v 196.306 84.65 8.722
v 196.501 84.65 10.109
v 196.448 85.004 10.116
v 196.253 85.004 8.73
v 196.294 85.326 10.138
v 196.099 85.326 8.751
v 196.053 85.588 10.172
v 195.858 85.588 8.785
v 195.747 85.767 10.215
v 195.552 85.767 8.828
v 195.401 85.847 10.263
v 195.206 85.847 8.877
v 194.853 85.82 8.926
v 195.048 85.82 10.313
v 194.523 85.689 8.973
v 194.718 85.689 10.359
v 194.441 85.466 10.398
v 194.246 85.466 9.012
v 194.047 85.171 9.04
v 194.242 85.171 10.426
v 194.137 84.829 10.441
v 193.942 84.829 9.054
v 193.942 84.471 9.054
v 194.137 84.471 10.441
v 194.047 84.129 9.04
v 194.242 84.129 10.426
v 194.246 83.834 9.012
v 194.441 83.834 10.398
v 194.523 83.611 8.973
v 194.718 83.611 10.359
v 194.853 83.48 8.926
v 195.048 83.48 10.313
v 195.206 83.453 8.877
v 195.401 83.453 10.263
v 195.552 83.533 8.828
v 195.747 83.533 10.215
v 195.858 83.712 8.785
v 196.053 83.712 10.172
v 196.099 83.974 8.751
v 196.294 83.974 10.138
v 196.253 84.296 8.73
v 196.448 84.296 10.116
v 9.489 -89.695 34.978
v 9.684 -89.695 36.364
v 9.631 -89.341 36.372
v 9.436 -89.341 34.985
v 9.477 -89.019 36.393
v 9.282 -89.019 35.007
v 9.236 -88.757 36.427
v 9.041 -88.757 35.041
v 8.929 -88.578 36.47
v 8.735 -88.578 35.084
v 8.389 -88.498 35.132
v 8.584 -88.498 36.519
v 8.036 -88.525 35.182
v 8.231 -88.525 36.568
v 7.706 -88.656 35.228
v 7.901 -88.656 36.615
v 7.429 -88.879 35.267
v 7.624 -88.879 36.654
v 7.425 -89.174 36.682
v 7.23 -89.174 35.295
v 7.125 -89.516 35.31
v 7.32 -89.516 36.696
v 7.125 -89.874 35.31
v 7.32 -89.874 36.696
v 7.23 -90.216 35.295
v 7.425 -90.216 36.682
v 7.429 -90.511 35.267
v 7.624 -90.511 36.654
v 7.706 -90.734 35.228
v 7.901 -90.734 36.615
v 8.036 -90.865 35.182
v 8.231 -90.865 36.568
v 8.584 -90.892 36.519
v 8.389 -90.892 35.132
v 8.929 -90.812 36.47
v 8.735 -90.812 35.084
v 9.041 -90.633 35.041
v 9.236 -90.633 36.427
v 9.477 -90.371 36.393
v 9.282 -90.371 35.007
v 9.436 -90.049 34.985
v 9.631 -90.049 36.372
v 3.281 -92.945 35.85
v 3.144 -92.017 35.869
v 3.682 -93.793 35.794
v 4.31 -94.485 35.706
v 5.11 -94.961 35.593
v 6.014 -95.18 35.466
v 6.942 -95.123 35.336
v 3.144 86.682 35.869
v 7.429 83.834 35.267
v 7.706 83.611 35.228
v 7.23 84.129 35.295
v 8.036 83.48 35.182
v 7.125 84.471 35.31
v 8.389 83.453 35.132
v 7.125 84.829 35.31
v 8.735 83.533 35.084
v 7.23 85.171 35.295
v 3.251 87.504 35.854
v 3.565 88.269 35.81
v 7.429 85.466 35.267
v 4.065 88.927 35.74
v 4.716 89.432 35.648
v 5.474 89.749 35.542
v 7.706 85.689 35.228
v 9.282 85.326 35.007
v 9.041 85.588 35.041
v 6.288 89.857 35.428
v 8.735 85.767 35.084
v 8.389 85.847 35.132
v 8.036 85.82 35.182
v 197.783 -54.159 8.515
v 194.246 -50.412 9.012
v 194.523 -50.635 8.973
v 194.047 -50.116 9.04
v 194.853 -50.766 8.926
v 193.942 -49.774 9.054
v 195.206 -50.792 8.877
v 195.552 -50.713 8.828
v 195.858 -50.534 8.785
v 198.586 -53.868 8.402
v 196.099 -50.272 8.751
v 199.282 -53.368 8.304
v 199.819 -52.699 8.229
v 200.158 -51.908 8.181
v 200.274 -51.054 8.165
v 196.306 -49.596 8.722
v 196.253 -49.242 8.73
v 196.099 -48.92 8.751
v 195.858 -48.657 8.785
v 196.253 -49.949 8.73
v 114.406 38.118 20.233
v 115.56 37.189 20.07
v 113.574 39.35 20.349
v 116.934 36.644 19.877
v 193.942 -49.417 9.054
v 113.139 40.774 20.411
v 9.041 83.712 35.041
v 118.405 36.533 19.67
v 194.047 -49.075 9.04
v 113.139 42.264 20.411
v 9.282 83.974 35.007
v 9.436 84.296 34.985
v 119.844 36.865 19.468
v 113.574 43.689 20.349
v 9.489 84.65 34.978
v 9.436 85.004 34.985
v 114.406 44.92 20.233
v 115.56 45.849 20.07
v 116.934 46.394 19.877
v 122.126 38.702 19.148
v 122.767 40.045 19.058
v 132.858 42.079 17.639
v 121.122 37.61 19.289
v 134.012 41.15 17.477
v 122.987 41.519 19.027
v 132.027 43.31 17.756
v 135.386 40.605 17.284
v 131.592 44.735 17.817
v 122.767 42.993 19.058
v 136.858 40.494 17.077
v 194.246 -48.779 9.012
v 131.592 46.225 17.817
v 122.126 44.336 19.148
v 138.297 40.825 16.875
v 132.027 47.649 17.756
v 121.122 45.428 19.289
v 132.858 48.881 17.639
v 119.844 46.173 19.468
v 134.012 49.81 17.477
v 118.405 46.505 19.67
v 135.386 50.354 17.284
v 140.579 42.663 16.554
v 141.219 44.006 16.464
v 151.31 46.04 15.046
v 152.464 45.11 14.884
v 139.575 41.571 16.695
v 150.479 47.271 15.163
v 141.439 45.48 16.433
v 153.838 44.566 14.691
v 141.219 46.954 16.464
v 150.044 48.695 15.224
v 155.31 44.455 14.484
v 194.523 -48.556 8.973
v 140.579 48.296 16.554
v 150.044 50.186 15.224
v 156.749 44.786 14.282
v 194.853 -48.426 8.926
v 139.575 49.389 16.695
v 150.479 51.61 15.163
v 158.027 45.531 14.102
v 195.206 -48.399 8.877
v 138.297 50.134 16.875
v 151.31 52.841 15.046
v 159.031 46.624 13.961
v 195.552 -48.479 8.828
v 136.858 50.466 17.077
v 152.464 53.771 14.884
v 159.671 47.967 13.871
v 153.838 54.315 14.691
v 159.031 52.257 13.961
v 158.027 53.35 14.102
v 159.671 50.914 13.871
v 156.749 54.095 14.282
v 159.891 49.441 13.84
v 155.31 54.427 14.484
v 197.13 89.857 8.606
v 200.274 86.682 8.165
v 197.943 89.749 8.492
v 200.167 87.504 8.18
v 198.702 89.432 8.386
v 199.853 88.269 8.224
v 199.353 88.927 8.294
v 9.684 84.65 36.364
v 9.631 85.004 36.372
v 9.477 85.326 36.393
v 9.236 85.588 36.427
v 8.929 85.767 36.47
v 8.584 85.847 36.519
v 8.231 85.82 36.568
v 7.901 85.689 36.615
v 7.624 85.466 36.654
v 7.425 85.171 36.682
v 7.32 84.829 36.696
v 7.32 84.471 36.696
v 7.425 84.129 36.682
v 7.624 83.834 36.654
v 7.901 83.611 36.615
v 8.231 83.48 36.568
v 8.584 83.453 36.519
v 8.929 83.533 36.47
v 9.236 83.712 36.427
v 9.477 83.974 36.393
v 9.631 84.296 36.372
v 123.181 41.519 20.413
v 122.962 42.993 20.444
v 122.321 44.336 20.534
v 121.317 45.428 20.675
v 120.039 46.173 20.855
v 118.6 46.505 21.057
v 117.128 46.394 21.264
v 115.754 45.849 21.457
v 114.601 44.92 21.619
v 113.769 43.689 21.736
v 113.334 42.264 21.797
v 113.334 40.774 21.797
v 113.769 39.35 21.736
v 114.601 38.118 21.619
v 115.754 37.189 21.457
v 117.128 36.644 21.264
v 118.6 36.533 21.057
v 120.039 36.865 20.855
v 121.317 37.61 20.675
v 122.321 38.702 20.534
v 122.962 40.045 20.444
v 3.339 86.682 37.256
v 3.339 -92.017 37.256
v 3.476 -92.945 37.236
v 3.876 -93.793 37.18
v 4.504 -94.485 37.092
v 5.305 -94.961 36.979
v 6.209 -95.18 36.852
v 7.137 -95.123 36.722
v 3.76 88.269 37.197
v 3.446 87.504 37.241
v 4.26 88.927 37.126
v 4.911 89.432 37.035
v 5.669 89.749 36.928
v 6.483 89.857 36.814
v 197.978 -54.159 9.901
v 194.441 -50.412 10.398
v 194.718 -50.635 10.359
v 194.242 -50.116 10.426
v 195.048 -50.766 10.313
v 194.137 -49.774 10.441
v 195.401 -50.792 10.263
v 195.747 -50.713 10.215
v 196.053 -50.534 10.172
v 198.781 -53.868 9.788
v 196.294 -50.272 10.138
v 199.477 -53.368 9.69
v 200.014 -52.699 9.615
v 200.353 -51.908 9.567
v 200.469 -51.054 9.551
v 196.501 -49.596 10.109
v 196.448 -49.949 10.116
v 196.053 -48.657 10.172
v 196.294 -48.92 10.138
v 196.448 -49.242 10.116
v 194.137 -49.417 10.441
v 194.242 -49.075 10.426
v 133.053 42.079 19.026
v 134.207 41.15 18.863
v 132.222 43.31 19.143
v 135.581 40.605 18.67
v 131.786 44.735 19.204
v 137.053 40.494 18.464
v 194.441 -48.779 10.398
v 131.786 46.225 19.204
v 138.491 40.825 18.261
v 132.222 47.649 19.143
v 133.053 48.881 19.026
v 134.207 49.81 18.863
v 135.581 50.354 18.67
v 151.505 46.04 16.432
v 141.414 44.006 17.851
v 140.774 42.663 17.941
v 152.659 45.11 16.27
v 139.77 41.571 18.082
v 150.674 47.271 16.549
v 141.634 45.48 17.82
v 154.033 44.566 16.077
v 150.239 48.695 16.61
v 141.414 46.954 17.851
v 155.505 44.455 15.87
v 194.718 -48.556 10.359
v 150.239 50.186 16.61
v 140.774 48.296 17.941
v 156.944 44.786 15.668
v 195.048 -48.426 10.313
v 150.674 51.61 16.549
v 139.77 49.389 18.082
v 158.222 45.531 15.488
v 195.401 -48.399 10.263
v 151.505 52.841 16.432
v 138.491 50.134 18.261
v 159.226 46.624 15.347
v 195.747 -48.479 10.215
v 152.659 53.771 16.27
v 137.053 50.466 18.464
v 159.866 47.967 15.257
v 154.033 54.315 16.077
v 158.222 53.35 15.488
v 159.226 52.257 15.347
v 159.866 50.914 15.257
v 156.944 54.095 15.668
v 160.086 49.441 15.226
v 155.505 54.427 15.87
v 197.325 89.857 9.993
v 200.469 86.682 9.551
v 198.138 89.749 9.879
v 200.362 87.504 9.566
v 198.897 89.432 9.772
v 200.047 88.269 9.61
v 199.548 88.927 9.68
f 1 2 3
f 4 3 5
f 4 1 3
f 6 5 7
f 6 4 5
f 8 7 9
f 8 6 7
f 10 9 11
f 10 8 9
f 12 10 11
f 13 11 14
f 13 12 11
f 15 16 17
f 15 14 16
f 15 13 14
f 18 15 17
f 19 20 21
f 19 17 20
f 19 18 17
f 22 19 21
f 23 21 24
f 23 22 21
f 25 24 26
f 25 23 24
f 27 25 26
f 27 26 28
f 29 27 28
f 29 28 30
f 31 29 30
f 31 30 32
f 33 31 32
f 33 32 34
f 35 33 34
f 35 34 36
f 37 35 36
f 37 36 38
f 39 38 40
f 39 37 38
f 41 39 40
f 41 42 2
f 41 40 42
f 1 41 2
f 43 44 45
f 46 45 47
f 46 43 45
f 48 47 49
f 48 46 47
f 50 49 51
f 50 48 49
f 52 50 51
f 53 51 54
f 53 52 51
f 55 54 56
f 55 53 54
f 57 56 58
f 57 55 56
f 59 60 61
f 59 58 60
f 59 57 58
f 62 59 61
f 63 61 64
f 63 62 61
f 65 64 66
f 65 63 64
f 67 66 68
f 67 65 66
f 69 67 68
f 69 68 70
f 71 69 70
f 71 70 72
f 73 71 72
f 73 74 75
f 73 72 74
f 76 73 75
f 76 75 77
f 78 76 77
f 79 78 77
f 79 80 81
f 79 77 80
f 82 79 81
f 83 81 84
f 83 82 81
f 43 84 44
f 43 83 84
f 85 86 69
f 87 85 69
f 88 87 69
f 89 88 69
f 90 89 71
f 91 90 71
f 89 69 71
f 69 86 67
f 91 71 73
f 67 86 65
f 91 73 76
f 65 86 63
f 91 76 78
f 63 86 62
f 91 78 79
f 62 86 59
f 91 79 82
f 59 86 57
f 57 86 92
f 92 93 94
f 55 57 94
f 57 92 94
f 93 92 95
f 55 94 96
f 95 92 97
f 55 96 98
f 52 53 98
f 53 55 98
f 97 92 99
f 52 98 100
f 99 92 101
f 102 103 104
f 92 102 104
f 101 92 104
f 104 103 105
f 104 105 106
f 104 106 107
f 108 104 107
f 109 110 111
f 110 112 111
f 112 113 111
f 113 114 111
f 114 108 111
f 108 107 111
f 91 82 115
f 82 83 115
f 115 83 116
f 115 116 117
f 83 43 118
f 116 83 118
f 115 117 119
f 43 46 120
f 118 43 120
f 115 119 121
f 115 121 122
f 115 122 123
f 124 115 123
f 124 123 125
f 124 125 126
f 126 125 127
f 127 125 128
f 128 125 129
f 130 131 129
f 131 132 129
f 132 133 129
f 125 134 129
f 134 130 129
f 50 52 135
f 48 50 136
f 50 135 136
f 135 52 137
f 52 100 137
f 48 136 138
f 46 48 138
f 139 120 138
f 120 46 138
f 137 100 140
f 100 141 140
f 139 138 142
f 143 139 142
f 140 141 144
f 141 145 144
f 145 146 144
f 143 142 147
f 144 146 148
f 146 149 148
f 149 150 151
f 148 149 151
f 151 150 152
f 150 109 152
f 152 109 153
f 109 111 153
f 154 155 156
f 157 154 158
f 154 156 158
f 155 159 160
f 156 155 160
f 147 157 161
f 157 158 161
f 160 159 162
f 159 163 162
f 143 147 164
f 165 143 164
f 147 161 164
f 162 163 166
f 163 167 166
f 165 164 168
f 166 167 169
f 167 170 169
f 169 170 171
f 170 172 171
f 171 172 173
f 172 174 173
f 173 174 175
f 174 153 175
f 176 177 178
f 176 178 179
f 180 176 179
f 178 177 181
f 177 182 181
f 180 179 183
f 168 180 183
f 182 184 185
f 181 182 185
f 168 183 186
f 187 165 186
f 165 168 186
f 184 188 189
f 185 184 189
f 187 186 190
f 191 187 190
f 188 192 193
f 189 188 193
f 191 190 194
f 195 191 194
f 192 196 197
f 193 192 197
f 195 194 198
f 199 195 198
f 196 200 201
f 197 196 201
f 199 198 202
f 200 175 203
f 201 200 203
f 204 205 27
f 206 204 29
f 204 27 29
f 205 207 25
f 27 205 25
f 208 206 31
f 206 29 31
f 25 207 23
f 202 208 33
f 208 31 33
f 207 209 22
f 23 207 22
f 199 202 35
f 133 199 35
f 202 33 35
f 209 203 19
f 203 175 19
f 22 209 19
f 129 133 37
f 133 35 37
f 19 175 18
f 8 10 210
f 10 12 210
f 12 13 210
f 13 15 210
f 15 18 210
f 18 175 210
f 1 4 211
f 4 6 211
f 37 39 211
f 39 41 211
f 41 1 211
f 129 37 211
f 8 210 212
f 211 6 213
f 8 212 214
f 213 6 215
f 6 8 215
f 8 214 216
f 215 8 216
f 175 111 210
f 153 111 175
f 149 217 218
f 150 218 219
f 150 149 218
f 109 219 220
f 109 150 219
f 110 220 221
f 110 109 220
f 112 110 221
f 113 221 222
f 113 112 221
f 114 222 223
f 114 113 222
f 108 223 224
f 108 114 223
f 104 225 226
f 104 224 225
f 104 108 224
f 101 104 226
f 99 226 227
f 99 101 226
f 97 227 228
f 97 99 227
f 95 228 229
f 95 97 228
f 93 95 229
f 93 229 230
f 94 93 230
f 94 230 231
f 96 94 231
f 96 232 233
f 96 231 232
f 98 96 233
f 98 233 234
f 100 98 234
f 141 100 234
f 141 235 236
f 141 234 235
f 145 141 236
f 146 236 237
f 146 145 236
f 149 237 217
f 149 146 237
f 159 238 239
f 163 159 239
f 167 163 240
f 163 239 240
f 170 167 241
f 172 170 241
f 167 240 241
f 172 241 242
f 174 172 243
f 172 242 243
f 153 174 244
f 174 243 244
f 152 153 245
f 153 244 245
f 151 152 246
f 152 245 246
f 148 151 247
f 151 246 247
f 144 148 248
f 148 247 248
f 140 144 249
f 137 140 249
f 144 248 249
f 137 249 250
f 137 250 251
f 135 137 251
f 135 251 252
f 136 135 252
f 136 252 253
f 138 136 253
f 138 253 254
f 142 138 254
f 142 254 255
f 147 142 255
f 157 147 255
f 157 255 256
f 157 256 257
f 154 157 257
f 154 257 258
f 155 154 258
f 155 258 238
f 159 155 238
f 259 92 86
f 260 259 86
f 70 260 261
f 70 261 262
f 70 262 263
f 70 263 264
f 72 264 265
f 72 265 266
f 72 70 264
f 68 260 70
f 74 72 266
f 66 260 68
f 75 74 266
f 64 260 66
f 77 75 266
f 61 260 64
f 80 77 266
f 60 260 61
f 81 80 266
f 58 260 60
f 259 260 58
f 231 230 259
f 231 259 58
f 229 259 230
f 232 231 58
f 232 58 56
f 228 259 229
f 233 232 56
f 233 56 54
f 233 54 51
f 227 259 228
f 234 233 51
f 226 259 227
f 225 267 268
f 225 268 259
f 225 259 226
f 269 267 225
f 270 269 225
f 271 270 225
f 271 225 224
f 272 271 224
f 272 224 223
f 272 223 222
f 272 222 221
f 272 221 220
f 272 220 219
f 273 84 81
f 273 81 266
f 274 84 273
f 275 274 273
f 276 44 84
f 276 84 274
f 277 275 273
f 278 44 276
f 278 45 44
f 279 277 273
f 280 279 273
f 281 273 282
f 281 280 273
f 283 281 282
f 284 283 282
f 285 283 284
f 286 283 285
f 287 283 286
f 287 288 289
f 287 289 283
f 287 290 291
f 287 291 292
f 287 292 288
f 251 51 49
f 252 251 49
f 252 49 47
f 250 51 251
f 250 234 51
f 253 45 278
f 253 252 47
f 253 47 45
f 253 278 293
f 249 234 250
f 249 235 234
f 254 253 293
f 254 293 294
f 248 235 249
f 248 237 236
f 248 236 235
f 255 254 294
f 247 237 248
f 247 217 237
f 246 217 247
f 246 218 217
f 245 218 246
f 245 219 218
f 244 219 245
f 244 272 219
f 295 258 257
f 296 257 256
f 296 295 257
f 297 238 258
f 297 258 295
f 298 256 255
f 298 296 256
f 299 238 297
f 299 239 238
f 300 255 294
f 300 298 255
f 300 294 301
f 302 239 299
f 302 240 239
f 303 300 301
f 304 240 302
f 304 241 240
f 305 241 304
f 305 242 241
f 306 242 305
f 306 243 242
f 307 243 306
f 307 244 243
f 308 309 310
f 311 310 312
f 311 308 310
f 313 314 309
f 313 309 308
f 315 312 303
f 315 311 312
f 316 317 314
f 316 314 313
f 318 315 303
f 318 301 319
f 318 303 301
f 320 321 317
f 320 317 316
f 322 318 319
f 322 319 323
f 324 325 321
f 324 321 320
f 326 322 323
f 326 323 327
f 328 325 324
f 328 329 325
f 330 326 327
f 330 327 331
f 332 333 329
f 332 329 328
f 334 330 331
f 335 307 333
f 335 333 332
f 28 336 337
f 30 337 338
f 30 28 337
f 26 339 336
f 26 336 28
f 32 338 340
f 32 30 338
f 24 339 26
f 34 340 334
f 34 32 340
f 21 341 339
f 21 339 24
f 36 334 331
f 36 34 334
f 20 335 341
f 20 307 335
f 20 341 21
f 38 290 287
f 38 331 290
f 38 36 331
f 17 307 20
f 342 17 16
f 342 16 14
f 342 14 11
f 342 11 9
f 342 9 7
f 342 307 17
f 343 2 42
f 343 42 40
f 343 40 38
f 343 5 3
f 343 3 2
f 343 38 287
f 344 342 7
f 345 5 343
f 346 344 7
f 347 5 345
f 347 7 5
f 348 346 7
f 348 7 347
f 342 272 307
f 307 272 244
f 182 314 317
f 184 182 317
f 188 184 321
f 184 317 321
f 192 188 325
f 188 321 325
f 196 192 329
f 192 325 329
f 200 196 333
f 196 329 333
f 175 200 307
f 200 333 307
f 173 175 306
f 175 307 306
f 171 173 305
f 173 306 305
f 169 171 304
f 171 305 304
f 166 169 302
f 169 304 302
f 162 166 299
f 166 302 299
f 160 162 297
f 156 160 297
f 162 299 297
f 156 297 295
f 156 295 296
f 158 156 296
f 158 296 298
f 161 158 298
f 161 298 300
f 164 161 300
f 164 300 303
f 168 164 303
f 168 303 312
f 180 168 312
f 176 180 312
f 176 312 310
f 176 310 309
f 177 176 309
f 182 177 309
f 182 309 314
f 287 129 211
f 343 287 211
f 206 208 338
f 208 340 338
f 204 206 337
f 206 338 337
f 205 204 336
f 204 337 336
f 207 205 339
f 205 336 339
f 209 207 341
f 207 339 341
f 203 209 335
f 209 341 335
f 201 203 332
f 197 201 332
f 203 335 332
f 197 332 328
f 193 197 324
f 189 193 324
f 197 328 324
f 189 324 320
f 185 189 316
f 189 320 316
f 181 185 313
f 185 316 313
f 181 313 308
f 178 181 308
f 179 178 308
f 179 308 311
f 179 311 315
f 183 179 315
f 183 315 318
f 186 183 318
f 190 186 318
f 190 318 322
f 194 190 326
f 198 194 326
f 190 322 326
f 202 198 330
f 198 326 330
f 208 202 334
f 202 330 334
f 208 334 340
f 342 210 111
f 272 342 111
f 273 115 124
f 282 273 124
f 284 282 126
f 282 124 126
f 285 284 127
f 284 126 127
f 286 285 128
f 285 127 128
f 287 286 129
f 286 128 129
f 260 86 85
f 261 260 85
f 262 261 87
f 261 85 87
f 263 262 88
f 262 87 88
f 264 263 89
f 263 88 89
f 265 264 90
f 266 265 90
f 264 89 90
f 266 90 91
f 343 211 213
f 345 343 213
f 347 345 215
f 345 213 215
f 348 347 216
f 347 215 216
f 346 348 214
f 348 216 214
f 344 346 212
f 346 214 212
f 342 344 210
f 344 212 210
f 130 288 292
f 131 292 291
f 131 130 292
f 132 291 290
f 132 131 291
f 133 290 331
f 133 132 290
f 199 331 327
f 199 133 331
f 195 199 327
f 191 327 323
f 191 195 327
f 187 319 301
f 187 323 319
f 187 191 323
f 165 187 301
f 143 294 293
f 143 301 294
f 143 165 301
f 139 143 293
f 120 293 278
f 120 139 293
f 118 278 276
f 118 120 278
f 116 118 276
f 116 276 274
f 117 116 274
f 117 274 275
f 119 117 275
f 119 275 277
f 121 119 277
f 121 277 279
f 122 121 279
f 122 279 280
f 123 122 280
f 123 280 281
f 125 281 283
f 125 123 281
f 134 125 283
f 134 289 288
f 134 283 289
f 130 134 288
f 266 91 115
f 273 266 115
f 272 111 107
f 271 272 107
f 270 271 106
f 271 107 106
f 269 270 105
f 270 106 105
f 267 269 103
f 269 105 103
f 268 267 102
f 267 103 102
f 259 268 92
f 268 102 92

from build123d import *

# Parameters (mm, degrees)
SKETCH030_AS_DRAWN_R                      = 5
EXTRUDE025_DEPTH                          = 25.4
EXTRUDE025_ONTO_SKETCH030_PLACEMENT_ANGLE = 8
SKETCH018_AS_DRAWN_R                      = 1.2
EXTRUDE009_DEPTH                          = 7.8
EXTRUDE009_ONTO_SKETCH018_PLACEMENT_ANGLE = 8
EXTRUDE010_DEPTH                          = 1.4
EXTRUDE010_ONTO_SKETCH019_PLACEMENT_ANGLE = 8


with BuildPart() as plate_led_holes:
    # Sketch030 as drawn → Extrude025 (new, symmetric)
    with BuildSketch(Plane.XY):
        with Locations((78.81499, 41.5191)):
            Circle(SKETCH030_AS_DRAWN_R)
        with Locations((97.448702, 45.479818)):
            Circle(SKETCH030_AS_DRAWN_R)
        with Locations((116.082414, 49.440535)):
            Circle(SKETCH030_AS_DRAWN_R)
    extrude(amount=EXTRUDE025_DEPTH, both=True)


with BuildPart() as plate_led_holes_1:
    # Extrude025 onto Sketch030 placement: moved
    add(plate_led_holes.part.moved(Location((42.3672, 0, 47.625))).rotate(Axis((42.3672, 0, 47.625), (0, 1, 0)), EXTRUDE025_ONTO_SKETCH030_PLACEMENT_ANGLE))


with BuildPart() as screw_hole_cuts:
    # Sketch018 as drawn → Extrude009 (new)
    with BuildSketch(Plane.XY):
        with Locations((-31.998318, 84.649891)):
            Circle(SKETCH018_AS_DRAWN_R)
        with Locations((-31.998318, -89.695043)):
            Circle(SKETCH018_AS_DRAWN_R)
        with Locations((156.654735, -49.595599)):
            Circle(SKETCH018_AS_DRAWN_R)
        with Locations((156.654735, 84.649891)):
            Circle(SKETCH018_AS_DRAWN_R)
    extrude(amount=EXTRUDE009_DEPTH)


with BuildPart() as screw_hole_cuts_1:
    # Extrude009 onto Sketch018 placement: moved
    add(screw_hole_cuts.part.moved(Location((39.98734, 0, 30.691416))).rotate(Axis((39.98734, 0, 30.691416), (0, 1, 0)), EXTRUDE009_ONTO_SKETCH018_PLACEMENT_ANGLE))


with BuildPart() as cut017:
    # Sketch019 as drawn → Extrude010 (new)
    with BuildSketch(Plane.XY):
        with BuildLine():
            Line((-37.205318, 86.681891), (-37.205318, -92.017095))
            ThreePointArc((-37.205318, -92.017095), (-36.028411, -94.484534), (-33.370199, -95.122714))
            Line((-33.370199, -95.122714), (159.34685, -54.159441))
            ThreePointArc((159.34685, -54.159441), (161.154172, -53.051915), (161.861735, -51.053821))
            Line((161.861735, -51.053821), (161.861735, 86.681892))
            ThreePointArc((161.861735, 86.681892), (160.931799, 88.926956), (158.686734, 89.856891))
            Line((158.686734, 89.856891), (-34.030318, 89.856891))
            ThreePointArc((-34.030318, 89.856891), (-36.275382, 88.926955), (-37.205318, 86.681891))
        make_face()
    extrude(amount=EXTRUDE010_DEPTH)


with BuildPart() as cut017_1:
    # Extrude010 onto Sketch019 placement: moved
    add(cut017.part.moved(Location((39.98734, 0, 30.691416))).rotate(Axis((39.98734, 0, 30.691416), (0, 1, 0)), EXTRUDE010_ONTO_SKETCH019_PLACEMENT_ANGLE))

    # Cut002: cut Screw Hole Cuts
    add(screw_hole_cuts_1.part, mode=Mode.SUBTRACT)

    # Cut017: cut Plate LED Holes
    add(plate_led_holes_1.part, mode=Mode.SUBTRACT)


solid = cut017_1.part
